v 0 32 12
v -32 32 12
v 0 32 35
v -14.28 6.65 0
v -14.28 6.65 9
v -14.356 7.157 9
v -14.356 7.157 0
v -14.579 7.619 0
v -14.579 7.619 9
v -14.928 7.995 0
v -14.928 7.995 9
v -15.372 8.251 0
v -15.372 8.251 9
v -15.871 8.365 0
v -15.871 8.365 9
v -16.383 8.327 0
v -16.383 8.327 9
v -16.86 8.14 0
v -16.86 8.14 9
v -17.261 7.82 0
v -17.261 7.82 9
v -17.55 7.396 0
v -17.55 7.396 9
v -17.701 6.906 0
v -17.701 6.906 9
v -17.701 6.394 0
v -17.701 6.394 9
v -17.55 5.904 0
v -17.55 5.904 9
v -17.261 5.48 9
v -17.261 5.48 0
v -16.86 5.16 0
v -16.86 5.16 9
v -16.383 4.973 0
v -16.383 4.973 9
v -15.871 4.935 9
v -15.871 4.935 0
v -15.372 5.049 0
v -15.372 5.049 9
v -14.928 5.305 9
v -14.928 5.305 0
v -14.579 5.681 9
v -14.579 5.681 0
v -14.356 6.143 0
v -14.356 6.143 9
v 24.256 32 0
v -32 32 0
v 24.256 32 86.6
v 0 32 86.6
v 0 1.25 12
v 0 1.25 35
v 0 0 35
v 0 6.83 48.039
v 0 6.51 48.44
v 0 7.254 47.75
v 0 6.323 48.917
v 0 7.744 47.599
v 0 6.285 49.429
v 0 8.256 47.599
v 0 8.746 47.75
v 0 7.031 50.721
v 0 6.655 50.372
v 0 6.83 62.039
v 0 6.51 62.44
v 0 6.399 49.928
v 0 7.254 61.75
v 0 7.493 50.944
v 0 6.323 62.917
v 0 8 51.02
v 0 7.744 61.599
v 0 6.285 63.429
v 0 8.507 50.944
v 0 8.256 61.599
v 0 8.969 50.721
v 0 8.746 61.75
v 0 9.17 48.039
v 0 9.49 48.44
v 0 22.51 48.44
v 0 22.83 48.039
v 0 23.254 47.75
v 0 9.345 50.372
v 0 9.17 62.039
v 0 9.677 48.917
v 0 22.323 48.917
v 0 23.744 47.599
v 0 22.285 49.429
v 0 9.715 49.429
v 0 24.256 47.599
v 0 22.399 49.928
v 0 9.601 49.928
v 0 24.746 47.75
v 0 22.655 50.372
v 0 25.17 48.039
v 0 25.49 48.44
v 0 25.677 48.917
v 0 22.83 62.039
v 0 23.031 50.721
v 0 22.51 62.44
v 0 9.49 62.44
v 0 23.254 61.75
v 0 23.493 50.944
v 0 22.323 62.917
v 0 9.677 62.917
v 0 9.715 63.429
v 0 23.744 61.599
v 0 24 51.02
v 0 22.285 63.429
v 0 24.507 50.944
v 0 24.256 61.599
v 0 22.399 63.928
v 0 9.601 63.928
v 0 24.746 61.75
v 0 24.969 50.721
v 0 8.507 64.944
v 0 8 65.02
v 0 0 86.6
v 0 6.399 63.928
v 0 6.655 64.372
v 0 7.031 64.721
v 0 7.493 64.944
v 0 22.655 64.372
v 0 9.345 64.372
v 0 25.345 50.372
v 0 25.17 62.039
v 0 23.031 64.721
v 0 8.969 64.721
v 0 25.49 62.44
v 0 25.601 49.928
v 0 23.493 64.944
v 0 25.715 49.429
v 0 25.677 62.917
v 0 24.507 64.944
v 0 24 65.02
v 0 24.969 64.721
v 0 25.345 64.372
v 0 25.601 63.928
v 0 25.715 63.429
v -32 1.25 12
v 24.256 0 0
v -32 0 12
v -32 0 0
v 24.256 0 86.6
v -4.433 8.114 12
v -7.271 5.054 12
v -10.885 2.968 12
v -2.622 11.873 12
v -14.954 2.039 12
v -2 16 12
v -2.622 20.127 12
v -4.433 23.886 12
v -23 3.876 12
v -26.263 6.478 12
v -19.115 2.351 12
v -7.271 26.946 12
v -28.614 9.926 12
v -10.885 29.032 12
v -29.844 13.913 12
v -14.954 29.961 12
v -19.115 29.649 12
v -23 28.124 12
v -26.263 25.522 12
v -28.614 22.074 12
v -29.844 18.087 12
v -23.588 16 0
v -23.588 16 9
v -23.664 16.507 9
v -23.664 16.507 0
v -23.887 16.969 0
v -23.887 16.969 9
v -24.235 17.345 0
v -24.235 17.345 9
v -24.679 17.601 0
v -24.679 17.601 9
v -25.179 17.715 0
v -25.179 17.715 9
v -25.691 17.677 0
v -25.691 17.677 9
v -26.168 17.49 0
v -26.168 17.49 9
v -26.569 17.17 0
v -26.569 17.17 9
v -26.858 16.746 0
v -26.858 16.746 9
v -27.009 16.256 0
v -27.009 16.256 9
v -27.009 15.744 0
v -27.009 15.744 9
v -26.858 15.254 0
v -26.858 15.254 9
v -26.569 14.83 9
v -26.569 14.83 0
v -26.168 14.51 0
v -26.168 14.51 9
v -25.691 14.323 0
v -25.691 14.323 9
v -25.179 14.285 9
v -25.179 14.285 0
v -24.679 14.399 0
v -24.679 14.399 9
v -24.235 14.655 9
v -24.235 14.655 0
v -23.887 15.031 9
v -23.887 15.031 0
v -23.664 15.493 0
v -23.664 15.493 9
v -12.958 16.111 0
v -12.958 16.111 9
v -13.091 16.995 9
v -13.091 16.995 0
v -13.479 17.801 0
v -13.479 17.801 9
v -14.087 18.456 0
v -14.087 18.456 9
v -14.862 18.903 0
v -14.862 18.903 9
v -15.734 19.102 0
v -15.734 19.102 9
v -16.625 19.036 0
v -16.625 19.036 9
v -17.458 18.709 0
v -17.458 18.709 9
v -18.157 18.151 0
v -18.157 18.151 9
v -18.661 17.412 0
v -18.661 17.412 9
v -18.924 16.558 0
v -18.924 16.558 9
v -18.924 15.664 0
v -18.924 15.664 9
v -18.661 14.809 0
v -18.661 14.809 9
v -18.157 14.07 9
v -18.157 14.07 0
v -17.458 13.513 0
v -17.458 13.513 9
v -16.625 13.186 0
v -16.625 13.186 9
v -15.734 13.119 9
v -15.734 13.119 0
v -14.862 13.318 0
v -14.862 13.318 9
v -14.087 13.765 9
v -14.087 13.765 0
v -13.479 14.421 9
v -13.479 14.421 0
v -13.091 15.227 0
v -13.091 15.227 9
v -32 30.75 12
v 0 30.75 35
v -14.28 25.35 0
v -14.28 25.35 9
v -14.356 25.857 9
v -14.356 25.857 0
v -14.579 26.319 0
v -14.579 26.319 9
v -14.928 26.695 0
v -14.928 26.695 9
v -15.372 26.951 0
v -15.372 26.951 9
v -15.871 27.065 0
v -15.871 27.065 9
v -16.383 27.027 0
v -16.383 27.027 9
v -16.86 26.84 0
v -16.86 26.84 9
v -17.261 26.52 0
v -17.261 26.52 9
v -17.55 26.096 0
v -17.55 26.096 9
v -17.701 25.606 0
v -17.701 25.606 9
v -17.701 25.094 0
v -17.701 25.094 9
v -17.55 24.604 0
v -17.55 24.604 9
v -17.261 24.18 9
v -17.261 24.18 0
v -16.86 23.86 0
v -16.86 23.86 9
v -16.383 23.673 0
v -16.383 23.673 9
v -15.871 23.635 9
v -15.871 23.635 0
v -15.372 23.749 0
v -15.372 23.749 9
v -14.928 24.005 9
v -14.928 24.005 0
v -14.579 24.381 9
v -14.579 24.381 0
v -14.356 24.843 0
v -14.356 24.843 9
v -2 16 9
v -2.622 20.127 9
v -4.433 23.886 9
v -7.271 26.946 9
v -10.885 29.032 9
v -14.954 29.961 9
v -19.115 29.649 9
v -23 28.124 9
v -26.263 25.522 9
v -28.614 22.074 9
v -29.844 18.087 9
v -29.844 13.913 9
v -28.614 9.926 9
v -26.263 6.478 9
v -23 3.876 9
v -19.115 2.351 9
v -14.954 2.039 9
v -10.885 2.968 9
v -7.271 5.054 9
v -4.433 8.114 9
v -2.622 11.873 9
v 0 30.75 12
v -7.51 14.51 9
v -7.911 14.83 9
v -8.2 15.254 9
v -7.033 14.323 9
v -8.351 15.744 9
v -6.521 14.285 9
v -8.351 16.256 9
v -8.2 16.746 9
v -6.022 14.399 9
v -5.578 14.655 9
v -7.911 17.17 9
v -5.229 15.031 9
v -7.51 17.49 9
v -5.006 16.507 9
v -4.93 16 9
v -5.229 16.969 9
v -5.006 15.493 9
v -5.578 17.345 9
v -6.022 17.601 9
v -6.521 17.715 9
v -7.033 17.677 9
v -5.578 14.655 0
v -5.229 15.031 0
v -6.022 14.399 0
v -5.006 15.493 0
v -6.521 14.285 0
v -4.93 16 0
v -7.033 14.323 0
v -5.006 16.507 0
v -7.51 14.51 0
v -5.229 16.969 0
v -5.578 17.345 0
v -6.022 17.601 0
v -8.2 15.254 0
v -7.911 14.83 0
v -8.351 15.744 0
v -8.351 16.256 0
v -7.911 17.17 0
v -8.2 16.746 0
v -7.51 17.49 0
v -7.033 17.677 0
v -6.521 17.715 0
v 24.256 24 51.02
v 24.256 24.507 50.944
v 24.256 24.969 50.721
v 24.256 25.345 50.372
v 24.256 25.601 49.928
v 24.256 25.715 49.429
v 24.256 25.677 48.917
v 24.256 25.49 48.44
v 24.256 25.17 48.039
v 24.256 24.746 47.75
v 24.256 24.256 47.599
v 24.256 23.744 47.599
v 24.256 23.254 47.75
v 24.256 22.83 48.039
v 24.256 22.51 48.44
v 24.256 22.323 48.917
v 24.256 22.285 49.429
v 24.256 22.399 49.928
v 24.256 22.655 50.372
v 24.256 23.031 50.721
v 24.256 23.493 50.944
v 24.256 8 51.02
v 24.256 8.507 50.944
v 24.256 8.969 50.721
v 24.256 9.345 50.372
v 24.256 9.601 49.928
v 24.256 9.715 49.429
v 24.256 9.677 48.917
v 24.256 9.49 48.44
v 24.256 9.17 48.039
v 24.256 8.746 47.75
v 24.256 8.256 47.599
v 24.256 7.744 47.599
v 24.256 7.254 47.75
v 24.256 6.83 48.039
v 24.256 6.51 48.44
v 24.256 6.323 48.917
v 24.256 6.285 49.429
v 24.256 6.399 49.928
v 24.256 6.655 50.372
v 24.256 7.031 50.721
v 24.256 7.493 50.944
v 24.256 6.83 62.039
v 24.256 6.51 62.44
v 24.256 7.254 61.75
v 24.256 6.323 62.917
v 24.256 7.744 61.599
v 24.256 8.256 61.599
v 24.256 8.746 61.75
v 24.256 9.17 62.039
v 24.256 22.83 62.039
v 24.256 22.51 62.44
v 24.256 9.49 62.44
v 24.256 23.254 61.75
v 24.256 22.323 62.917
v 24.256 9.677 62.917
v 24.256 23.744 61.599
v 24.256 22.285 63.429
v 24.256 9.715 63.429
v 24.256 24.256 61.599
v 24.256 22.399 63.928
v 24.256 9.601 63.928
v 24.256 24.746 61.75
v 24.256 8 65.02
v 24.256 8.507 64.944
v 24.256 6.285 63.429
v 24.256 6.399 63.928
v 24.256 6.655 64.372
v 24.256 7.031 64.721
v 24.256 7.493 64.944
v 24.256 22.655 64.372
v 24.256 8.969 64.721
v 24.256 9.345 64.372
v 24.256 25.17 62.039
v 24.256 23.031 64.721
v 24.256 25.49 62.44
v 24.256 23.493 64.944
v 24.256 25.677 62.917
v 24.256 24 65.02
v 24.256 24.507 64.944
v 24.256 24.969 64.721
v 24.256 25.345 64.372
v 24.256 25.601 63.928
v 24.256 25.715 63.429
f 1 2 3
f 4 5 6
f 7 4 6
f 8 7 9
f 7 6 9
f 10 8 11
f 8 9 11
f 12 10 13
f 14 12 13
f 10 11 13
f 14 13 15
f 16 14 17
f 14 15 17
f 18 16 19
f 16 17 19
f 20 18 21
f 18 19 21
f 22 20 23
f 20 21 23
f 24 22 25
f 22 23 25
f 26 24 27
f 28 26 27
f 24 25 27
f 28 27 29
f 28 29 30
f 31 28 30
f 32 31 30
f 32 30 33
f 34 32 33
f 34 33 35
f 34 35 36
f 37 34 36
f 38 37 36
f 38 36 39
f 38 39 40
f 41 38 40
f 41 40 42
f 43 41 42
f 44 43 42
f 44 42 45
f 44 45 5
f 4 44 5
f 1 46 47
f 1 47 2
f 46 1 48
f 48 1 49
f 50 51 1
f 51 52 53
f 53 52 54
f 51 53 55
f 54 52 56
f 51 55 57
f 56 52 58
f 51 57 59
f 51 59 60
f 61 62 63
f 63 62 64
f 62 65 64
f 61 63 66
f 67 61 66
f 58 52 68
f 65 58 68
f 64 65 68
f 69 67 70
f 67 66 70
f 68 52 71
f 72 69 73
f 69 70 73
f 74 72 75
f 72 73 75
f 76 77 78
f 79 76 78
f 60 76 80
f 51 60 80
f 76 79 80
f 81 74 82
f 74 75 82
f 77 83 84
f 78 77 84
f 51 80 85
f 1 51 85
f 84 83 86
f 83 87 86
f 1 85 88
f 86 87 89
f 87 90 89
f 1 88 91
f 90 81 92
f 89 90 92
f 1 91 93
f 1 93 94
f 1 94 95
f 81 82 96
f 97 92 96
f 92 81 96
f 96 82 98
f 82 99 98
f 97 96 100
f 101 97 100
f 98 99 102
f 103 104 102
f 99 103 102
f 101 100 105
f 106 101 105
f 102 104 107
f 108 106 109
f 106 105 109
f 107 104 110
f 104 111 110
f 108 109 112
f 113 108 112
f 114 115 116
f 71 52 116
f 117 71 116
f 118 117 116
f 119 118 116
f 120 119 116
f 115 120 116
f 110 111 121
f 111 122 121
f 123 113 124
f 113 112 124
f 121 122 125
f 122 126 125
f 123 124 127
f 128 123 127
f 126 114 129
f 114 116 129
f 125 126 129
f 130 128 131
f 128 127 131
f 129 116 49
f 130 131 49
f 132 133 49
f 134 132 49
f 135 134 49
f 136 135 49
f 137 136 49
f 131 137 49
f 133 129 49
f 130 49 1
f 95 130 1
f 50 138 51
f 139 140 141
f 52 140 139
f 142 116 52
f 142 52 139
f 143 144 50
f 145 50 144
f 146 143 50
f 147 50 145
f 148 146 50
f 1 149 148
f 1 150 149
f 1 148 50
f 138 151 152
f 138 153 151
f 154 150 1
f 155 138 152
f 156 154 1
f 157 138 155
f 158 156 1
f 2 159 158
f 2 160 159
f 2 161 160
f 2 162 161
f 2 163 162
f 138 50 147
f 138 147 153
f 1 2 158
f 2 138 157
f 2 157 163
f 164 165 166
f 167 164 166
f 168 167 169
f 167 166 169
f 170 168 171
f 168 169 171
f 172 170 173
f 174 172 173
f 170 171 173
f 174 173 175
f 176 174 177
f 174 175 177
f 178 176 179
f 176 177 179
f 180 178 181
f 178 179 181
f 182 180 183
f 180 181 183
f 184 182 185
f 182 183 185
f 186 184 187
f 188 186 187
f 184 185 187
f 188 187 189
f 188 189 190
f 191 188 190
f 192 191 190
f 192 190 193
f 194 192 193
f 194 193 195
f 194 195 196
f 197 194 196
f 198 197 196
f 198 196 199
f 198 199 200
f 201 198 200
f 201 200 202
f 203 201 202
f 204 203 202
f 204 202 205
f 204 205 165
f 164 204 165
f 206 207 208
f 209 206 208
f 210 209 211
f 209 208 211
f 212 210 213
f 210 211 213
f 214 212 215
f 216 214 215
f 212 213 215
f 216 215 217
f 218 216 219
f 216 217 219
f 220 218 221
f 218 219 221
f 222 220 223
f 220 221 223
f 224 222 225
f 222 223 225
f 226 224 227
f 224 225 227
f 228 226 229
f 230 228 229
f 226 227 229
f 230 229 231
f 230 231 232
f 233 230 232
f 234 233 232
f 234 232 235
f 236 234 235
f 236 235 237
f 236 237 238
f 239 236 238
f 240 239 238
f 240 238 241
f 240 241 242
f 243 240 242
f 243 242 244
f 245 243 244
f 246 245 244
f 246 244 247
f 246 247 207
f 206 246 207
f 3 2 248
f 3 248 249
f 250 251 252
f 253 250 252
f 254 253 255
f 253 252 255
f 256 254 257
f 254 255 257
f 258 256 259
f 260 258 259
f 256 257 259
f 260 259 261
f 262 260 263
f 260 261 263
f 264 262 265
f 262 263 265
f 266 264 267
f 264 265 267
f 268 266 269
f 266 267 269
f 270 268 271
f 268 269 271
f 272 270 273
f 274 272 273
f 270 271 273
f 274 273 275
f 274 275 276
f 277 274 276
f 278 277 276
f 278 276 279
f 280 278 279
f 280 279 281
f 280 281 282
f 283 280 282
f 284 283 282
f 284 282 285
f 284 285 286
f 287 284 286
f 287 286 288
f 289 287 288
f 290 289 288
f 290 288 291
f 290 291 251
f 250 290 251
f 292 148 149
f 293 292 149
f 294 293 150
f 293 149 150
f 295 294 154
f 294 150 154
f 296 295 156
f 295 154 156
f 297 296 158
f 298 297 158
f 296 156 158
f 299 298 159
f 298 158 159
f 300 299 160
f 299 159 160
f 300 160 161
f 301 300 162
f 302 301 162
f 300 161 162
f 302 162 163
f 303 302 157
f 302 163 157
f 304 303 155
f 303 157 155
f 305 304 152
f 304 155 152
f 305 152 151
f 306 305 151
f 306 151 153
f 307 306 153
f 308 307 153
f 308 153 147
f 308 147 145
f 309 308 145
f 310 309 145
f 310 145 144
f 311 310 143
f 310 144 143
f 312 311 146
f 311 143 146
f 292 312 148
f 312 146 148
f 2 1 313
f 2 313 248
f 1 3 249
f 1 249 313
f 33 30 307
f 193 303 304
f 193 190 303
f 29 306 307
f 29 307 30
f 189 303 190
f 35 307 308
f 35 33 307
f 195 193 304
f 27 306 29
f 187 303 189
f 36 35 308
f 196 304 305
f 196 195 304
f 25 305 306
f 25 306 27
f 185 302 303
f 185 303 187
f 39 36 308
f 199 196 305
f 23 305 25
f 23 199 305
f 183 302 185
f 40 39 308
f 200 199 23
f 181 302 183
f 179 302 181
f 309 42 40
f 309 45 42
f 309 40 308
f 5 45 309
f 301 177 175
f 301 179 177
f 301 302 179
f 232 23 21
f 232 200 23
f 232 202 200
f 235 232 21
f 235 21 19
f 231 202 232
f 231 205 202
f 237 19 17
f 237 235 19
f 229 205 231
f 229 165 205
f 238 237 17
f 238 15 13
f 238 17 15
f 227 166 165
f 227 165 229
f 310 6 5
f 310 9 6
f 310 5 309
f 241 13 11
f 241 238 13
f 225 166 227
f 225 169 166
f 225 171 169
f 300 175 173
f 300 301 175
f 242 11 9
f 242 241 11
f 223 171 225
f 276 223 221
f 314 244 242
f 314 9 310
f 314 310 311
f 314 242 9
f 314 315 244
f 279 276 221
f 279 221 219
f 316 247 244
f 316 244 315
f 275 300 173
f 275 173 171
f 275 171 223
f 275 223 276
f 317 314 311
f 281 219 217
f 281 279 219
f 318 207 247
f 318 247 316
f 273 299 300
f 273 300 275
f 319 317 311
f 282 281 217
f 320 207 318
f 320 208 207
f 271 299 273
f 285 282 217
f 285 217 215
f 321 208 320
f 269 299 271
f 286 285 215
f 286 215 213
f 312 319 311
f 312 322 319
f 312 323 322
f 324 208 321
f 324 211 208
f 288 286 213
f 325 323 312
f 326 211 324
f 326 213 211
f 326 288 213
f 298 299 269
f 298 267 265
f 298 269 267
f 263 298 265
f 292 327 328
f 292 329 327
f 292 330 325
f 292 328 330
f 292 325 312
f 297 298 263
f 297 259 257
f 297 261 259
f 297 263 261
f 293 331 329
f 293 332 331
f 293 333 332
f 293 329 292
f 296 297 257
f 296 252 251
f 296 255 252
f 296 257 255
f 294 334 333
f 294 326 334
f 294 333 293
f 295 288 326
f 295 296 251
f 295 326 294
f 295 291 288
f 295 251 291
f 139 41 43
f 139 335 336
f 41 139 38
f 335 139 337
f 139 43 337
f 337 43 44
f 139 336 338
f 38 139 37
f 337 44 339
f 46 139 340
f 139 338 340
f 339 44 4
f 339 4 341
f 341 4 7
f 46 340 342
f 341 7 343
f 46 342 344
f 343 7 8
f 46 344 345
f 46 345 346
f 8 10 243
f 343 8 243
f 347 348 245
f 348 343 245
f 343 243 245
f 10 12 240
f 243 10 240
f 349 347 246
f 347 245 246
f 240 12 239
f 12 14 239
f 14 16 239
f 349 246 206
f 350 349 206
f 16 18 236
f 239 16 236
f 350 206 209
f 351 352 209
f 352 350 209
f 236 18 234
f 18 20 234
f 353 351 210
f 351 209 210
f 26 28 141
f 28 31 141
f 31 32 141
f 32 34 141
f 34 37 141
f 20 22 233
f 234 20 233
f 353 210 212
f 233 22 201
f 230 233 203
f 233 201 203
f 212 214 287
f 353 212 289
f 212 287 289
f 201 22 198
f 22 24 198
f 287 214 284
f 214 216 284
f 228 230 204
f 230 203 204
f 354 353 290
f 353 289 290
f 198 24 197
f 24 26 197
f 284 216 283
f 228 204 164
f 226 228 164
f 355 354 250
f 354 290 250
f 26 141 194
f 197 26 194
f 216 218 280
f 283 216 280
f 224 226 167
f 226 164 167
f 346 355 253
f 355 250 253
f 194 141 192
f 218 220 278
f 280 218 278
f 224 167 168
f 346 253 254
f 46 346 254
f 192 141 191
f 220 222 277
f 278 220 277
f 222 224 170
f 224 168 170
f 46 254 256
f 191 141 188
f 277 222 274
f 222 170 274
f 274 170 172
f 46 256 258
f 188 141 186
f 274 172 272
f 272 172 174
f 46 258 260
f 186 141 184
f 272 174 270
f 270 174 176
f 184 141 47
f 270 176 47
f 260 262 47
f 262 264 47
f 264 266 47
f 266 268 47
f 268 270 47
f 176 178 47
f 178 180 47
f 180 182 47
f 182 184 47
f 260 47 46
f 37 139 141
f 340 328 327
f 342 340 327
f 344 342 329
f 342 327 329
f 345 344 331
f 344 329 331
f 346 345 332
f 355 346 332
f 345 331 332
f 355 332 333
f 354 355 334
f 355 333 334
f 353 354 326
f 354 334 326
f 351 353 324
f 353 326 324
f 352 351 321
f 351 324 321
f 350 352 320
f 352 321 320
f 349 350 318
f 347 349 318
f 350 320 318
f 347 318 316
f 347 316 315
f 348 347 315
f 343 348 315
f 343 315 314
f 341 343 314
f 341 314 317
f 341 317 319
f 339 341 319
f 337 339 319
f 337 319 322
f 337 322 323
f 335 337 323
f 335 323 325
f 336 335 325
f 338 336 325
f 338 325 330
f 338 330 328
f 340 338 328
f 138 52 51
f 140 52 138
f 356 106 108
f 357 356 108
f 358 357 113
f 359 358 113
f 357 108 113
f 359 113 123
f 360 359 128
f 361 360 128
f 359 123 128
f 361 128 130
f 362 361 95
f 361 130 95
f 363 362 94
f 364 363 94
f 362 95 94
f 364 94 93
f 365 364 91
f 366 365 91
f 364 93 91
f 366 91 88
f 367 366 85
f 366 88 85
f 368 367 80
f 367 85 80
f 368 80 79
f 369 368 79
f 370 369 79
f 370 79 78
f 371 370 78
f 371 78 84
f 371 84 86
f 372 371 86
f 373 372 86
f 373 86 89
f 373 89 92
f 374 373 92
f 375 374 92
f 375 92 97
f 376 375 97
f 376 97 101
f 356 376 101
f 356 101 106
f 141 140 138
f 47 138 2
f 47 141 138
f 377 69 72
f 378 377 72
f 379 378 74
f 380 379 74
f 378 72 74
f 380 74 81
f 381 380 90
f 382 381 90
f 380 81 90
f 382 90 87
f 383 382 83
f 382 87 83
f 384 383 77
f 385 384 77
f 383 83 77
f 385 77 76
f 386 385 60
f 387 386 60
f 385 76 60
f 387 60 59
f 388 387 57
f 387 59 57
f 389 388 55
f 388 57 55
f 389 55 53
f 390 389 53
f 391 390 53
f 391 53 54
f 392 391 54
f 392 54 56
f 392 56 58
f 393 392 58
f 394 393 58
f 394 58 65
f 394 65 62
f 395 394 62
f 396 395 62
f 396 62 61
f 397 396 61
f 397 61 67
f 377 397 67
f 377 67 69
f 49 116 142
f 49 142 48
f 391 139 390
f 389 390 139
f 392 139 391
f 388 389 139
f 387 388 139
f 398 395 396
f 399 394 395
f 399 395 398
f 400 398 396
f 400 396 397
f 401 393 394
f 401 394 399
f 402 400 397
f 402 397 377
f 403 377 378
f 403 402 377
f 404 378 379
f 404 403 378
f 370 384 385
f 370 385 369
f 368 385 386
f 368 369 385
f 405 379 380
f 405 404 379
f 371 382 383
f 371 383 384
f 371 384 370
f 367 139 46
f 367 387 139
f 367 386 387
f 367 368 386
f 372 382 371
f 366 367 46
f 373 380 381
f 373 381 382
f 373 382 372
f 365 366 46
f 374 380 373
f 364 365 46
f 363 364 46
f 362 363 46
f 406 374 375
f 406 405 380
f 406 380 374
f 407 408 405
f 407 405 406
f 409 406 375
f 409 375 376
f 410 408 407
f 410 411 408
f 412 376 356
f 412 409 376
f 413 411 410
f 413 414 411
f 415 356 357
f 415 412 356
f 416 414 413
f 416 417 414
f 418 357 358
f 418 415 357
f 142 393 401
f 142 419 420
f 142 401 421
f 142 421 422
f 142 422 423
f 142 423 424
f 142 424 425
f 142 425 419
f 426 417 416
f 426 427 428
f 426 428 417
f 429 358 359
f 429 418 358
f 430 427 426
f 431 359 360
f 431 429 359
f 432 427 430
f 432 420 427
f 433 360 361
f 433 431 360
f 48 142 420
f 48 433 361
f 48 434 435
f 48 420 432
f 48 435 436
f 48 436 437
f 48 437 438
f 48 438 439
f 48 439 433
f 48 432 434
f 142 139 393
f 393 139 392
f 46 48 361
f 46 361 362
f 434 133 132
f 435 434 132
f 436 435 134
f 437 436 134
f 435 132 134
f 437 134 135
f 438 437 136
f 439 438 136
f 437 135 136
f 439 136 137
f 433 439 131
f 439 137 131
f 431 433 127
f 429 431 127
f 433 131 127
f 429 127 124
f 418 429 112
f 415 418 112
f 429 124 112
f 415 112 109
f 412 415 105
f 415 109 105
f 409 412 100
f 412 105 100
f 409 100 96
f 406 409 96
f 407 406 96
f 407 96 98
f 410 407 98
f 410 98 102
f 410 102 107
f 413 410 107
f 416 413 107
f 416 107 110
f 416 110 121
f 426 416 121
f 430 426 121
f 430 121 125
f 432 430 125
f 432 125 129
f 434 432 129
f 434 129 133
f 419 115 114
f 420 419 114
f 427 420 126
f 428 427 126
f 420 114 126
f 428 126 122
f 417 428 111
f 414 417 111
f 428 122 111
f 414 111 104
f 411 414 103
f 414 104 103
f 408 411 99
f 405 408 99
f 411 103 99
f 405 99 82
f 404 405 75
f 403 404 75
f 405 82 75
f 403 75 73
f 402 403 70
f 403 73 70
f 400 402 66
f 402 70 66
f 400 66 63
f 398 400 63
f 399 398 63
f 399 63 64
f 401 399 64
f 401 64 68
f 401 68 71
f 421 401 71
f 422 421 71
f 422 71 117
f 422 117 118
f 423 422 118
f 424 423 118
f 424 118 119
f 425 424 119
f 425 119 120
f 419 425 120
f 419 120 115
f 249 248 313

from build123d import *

# Parameters (mm, degrees)
SKETCH1_W           = 32
SKETCH1_H           = 32
BOSS_EXTRUDE1_DEPTH = 12
SKETCH2_W           = 32
SKETCH2_H           = 86.6
BOSS_EXTRUDE2_DEPTH = 24.256442443
SKETCH3_R           = 14
CUT_EXTRUDE1_DEPTH  = 3
SKETCH4_R           = 3
CUT_EXTRUDE2_DEPTH  = 90.831842907
SKETCH9_R           = 1.72
CUT_EXTRUDE3_DEPTH  = 90.831842907
SKETCH10_R          = 1.72
CUT_EXTRUDE4_DEPTH  = 98.711616505
BOSS_EXTRUDE4_DEPTH = 1.25
BOSS_EXTRUDE5_DEPTH = 1.25


with BuildPart() as part:
    # Sketch1 → Boss-Extrude1 (new body)
    with BuildSketch(Plane(origin=(0, 0, 0), x_dir=(0, 1, 0), z_dir=(0, 0, 1))):
        with Locations((16, 16)):
            Rectangle(SKETCH1_W, SKETCH1_H)
    extrude(amount=BOSS_EXTRUDE1_DEPTH)

    # Sketch2 → Boss-Extrude2 (add)
    with BuildSketch(Plane.YZ):
        with Locations((16, 43.3)):
            Rectangle(SKETCH2_W, SKETCH2_H)
    extrude(amount=BOSS_EXTRUDE2_DEPTH)

    # Sketch3 → Cut-Extrude1 (cut)
    with BuildSketch(Plane.XY.offset(12)):
        with Locations((-16, 16)):
            Circle(SKETCH3_R)
    extrude(amount=-CUT_EXTRUDE1_DEPTH, mode=Mode.SUBTRACT)

    # Sketch4 → Cut-Extrude2 (cut, through all)
    with BuildSketch(Plane.XY.offset(9)):
        with Locations((-15.957836343, 16.110848394)):
            Circle(SKETCH4_R)
    extrude(amount=-CUT_EXTRUDE2_DEPTH, mode=Mode.SUBTRACT)

    # Sketch9 → Cut-Extrude3 (cut, through all)
    with BuildSketch(Plane.XY.offset(9)):
        with Locations((-16, 25.35)):
            Circle(SKETCH9_R)
        with Locations((-16, 6.65)):
            Circle(SKETCH9_R)
        with Locations((-6.65, 16)):
            Circle(SKETCH9_R)
        with Locations((-25.307836343, 16)):
            Circle(SKETCH9_R)
    extrude(amount=-CUT_EXTRUDE3_DEPTH, mode=Mode.SUBTRACT)

    # Sketch10 → Cut-Extrude4 (cut, through all)
    with BuildSketch(Plane(origin=(0, 0, 0), x_dir=(0, -1, 0), z_dir=(-1, 0, 0))):
        with Locations(Location((-24, 63.3, 0), (0, 0, 90))):
            Circle(SKETCH10_R)
        with Locations(Location((-24, 49.3, 0), (0, 0, 90))):
            Circle(SKETCH10_R)
        with Locations(Location((-8, 63.3, 0), (0, 0, 90))):
            Circle(SKETCH10_R)
        with Locations(Location((-8, 49.3, 0), (0, 0, 90))):
            Circle(SKETCH10_R)
    extrude(amount=-CUT_EXTRUDE4_DEPTH, mode=Mode.SUBTRACT)

    # Sketch12 → Boss-Extrude4 (add)
    with BuildSketch(Plane(origin=(0, 0, 0), x_dir=(-1, 0, 0), z_dir=(0, 1, 0))):
        Polygon((32, 12), (0, 12), (0, 35), align=None)
    extrude(amount=BOSS_EXTRUDE4_DEPTH)


with BuildPart() as body_2:
    # 3DSketch5 → Boss-Extrude5 (new body)
    with BuildSketch(Plane(origin=(0, 32, 35), x_dir=(-0.812015371342713, 0, -0.583636048152576), z_dir=(0, -1, 0))):
        Polygon((0, 0), (13.423629108, 18.676353541), (39.40812099, 0), align=None)
    extrude(amount=BOSS_EXTRUDE5_DEPTH)


solid = Compound([part.part, body_2.part])
